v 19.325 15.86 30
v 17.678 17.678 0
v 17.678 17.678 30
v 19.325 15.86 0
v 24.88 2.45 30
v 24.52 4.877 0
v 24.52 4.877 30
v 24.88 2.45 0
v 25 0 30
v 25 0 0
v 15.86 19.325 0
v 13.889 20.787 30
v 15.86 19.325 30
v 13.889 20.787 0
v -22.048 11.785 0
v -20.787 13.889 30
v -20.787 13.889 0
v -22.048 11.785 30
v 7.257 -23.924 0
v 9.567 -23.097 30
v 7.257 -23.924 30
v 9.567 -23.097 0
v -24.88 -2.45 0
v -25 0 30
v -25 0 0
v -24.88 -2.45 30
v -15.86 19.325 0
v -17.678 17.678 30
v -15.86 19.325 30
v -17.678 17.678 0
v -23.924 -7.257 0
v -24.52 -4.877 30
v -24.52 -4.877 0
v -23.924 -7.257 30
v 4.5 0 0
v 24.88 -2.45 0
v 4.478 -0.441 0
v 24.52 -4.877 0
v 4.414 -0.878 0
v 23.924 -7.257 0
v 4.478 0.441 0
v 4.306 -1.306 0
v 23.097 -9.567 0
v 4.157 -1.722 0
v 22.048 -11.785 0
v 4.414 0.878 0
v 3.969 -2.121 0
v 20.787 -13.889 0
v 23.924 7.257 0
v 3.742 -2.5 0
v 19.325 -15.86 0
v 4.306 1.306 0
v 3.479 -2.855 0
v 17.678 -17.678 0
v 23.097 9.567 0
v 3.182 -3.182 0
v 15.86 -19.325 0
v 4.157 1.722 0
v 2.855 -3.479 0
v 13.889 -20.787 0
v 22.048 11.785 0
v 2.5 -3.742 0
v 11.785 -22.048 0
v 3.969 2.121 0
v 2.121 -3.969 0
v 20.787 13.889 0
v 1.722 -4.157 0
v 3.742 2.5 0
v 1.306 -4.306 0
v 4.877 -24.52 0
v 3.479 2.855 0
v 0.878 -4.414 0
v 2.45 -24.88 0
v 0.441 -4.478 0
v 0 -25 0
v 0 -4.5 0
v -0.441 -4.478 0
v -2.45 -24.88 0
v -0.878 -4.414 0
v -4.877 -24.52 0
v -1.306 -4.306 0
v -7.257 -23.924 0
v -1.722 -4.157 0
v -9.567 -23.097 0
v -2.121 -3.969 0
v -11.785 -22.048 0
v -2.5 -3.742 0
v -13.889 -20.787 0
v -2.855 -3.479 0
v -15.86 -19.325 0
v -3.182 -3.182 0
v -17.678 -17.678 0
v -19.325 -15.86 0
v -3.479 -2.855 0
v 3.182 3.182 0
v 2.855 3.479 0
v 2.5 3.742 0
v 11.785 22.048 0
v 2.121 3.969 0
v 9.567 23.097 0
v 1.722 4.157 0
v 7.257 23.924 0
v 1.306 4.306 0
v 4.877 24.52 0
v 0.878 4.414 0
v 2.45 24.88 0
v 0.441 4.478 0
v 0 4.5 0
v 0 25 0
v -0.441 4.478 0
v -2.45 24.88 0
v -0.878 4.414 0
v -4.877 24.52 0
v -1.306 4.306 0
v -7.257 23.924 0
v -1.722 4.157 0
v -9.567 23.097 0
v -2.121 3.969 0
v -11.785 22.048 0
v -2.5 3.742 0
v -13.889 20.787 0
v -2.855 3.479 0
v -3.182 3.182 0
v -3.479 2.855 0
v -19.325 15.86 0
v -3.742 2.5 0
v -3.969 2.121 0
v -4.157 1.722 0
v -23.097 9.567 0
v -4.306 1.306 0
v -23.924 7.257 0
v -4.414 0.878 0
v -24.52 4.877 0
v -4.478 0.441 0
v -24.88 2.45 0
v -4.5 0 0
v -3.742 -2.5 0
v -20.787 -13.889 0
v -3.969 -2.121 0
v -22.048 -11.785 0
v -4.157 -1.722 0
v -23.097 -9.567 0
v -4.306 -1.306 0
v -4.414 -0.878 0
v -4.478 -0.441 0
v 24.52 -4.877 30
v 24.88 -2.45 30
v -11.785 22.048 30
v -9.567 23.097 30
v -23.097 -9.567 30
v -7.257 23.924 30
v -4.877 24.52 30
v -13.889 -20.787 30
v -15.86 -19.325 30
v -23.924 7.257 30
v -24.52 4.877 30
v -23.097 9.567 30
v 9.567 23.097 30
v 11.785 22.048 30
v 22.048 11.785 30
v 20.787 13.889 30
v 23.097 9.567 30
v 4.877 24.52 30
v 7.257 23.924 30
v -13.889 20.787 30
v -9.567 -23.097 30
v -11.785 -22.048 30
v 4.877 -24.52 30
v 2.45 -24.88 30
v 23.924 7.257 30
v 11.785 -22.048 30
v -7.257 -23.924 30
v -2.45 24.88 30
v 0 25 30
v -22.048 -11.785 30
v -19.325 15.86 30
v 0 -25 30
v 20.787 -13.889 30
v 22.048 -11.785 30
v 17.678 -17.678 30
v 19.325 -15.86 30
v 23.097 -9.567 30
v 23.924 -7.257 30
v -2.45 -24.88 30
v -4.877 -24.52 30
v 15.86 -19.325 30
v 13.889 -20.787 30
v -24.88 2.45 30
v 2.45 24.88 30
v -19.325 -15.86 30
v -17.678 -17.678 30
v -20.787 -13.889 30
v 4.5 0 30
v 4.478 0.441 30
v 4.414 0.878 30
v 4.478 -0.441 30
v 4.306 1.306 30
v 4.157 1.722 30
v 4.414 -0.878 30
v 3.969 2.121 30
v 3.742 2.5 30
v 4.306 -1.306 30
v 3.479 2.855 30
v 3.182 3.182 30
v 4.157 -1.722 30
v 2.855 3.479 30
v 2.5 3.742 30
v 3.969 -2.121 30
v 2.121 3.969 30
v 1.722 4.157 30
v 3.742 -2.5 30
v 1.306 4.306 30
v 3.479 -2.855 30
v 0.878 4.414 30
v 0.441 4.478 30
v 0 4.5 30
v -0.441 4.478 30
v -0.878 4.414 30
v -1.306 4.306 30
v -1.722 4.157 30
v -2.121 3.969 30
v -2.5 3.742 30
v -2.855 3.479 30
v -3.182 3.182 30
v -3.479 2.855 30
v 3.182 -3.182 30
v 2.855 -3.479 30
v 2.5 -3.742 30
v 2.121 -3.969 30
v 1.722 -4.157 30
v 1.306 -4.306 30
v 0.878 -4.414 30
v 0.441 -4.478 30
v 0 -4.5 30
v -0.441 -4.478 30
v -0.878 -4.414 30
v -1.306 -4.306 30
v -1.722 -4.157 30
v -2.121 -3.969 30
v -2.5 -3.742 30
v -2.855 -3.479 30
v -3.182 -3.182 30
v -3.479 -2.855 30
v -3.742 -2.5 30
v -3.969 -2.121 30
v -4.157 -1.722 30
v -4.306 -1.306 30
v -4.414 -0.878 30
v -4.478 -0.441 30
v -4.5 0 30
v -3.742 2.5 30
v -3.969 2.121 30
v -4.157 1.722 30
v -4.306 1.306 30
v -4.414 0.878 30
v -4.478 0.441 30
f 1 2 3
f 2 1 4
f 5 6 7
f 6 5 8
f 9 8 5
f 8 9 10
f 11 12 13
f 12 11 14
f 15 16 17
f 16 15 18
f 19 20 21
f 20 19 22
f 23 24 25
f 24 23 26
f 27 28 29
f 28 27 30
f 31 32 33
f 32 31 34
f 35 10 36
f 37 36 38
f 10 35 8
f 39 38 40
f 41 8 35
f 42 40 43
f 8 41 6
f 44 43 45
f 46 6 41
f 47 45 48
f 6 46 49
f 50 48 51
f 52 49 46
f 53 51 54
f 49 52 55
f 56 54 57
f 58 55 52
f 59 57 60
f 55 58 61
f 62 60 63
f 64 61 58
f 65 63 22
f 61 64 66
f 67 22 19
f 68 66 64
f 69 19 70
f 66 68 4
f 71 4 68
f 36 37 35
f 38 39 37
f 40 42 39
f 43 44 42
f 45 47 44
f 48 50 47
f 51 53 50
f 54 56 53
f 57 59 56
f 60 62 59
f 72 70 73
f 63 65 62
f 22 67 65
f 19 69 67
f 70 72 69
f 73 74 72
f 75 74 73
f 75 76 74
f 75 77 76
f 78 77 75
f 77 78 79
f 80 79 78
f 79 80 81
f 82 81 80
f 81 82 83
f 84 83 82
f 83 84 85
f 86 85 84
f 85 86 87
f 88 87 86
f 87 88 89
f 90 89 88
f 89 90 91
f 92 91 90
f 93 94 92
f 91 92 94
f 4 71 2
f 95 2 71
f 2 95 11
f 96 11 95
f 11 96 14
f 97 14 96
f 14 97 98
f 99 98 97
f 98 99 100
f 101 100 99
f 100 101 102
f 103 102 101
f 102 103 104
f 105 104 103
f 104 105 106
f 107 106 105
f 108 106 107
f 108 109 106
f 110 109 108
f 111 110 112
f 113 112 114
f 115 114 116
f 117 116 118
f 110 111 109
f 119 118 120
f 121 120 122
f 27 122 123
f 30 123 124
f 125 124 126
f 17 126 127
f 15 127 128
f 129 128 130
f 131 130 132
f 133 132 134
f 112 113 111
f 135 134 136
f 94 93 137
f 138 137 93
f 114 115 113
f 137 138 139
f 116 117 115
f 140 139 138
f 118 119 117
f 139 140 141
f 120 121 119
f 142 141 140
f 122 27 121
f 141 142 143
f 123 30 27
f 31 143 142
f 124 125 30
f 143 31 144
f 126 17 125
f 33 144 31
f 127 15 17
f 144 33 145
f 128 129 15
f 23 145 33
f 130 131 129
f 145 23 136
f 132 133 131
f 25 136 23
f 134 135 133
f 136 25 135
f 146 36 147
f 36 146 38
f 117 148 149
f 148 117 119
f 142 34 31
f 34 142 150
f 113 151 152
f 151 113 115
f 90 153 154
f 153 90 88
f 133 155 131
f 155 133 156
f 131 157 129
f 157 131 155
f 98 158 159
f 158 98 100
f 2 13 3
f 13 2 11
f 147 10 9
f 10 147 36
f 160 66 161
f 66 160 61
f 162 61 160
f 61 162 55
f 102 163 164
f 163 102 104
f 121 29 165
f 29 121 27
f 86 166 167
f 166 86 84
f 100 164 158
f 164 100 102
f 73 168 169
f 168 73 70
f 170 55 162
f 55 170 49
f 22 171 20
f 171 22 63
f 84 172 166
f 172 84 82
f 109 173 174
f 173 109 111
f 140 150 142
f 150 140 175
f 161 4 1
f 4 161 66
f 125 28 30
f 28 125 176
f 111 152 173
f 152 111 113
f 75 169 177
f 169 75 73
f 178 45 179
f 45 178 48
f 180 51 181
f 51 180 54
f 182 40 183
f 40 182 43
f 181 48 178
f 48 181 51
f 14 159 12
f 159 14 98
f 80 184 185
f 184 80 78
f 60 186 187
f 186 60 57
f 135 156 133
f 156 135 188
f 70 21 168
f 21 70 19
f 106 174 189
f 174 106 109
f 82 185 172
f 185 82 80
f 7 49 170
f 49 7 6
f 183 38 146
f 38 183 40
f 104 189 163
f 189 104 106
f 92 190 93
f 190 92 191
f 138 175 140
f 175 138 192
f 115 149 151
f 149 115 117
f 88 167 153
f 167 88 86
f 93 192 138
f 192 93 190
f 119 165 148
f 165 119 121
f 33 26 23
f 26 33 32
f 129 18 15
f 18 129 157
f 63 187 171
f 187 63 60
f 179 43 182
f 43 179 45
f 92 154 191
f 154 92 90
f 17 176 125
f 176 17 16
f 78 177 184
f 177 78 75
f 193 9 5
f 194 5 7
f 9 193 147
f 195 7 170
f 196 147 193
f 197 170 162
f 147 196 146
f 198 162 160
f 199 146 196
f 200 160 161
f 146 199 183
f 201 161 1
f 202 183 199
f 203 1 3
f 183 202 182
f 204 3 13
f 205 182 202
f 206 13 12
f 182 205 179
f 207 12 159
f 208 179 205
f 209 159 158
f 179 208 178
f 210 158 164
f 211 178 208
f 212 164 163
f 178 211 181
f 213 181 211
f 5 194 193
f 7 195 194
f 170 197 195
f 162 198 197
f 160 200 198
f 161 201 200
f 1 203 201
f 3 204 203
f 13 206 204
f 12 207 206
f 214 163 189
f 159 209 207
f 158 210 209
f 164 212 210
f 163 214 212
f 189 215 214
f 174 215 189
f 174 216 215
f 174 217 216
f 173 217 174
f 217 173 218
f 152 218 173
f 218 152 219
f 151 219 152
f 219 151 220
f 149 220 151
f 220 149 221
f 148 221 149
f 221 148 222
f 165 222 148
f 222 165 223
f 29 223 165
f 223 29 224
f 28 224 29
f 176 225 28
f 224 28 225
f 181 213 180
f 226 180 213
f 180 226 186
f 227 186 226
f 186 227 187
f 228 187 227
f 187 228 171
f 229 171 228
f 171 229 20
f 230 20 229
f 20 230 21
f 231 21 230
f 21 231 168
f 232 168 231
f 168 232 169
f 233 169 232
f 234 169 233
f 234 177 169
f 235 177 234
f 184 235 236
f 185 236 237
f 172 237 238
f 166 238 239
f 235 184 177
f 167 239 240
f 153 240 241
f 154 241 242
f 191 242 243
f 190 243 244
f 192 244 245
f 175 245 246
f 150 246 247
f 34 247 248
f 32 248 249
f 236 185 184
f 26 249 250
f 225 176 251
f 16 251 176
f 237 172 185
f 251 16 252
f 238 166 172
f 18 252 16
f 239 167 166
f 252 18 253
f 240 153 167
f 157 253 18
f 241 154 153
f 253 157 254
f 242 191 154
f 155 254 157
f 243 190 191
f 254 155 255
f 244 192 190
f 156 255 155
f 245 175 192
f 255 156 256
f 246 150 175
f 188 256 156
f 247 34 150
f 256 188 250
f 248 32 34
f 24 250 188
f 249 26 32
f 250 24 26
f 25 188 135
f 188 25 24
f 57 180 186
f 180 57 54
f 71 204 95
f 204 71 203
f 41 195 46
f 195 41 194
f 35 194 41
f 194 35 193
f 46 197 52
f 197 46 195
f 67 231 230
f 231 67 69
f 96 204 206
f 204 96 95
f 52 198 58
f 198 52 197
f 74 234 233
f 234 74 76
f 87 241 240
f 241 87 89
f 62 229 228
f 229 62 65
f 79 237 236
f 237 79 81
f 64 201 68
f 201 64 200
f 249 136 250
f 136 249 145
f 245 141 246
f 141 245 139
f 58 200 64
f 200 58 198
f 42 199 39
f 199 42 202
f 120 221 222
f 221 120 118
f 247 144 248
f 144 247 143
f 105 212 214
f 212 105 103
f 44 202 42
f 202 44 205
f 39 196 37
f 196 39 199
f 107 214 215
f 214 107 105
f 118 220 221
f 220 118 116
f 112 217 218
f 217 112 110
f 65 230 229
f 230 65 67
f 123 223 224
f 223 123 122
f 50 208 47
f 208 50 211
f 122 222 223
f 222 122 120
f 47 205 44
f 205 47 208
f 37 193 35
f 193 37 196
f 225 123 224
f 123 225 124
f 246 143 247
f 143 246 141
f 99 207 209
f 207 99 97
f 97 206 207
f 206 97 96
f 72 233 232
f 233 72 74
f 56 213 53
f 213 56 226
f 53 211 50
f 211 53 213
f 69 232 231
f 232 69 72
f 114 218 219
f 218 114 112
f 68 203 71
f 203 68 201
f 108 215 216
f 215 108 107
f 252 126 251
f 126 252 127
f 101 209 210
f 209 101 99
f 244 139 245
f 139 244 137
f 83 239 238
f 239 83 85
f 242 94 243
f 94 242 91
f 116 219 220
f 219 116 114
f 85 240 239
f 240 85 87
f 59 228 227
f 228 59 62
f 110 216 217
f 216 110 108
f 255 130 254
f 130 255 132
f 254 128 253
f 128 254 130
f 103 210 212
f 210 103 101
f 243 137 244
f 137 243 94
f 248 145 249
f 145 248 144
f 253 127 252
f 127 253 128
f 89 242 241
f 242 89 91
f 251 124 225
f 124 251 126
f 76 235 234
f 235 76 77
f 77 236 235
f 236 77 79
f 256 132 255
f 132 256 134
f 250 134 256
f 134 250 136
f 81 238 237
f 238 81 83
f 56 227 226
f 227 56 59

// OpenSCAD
// Purchased steel ring stack: OD50/ID9, 10 x 3 mm. Not printable.
$fn=64;difference(){cylinder(d=50,h=30);translate([0,0,-1])cylinder(d=9,h=32);}
